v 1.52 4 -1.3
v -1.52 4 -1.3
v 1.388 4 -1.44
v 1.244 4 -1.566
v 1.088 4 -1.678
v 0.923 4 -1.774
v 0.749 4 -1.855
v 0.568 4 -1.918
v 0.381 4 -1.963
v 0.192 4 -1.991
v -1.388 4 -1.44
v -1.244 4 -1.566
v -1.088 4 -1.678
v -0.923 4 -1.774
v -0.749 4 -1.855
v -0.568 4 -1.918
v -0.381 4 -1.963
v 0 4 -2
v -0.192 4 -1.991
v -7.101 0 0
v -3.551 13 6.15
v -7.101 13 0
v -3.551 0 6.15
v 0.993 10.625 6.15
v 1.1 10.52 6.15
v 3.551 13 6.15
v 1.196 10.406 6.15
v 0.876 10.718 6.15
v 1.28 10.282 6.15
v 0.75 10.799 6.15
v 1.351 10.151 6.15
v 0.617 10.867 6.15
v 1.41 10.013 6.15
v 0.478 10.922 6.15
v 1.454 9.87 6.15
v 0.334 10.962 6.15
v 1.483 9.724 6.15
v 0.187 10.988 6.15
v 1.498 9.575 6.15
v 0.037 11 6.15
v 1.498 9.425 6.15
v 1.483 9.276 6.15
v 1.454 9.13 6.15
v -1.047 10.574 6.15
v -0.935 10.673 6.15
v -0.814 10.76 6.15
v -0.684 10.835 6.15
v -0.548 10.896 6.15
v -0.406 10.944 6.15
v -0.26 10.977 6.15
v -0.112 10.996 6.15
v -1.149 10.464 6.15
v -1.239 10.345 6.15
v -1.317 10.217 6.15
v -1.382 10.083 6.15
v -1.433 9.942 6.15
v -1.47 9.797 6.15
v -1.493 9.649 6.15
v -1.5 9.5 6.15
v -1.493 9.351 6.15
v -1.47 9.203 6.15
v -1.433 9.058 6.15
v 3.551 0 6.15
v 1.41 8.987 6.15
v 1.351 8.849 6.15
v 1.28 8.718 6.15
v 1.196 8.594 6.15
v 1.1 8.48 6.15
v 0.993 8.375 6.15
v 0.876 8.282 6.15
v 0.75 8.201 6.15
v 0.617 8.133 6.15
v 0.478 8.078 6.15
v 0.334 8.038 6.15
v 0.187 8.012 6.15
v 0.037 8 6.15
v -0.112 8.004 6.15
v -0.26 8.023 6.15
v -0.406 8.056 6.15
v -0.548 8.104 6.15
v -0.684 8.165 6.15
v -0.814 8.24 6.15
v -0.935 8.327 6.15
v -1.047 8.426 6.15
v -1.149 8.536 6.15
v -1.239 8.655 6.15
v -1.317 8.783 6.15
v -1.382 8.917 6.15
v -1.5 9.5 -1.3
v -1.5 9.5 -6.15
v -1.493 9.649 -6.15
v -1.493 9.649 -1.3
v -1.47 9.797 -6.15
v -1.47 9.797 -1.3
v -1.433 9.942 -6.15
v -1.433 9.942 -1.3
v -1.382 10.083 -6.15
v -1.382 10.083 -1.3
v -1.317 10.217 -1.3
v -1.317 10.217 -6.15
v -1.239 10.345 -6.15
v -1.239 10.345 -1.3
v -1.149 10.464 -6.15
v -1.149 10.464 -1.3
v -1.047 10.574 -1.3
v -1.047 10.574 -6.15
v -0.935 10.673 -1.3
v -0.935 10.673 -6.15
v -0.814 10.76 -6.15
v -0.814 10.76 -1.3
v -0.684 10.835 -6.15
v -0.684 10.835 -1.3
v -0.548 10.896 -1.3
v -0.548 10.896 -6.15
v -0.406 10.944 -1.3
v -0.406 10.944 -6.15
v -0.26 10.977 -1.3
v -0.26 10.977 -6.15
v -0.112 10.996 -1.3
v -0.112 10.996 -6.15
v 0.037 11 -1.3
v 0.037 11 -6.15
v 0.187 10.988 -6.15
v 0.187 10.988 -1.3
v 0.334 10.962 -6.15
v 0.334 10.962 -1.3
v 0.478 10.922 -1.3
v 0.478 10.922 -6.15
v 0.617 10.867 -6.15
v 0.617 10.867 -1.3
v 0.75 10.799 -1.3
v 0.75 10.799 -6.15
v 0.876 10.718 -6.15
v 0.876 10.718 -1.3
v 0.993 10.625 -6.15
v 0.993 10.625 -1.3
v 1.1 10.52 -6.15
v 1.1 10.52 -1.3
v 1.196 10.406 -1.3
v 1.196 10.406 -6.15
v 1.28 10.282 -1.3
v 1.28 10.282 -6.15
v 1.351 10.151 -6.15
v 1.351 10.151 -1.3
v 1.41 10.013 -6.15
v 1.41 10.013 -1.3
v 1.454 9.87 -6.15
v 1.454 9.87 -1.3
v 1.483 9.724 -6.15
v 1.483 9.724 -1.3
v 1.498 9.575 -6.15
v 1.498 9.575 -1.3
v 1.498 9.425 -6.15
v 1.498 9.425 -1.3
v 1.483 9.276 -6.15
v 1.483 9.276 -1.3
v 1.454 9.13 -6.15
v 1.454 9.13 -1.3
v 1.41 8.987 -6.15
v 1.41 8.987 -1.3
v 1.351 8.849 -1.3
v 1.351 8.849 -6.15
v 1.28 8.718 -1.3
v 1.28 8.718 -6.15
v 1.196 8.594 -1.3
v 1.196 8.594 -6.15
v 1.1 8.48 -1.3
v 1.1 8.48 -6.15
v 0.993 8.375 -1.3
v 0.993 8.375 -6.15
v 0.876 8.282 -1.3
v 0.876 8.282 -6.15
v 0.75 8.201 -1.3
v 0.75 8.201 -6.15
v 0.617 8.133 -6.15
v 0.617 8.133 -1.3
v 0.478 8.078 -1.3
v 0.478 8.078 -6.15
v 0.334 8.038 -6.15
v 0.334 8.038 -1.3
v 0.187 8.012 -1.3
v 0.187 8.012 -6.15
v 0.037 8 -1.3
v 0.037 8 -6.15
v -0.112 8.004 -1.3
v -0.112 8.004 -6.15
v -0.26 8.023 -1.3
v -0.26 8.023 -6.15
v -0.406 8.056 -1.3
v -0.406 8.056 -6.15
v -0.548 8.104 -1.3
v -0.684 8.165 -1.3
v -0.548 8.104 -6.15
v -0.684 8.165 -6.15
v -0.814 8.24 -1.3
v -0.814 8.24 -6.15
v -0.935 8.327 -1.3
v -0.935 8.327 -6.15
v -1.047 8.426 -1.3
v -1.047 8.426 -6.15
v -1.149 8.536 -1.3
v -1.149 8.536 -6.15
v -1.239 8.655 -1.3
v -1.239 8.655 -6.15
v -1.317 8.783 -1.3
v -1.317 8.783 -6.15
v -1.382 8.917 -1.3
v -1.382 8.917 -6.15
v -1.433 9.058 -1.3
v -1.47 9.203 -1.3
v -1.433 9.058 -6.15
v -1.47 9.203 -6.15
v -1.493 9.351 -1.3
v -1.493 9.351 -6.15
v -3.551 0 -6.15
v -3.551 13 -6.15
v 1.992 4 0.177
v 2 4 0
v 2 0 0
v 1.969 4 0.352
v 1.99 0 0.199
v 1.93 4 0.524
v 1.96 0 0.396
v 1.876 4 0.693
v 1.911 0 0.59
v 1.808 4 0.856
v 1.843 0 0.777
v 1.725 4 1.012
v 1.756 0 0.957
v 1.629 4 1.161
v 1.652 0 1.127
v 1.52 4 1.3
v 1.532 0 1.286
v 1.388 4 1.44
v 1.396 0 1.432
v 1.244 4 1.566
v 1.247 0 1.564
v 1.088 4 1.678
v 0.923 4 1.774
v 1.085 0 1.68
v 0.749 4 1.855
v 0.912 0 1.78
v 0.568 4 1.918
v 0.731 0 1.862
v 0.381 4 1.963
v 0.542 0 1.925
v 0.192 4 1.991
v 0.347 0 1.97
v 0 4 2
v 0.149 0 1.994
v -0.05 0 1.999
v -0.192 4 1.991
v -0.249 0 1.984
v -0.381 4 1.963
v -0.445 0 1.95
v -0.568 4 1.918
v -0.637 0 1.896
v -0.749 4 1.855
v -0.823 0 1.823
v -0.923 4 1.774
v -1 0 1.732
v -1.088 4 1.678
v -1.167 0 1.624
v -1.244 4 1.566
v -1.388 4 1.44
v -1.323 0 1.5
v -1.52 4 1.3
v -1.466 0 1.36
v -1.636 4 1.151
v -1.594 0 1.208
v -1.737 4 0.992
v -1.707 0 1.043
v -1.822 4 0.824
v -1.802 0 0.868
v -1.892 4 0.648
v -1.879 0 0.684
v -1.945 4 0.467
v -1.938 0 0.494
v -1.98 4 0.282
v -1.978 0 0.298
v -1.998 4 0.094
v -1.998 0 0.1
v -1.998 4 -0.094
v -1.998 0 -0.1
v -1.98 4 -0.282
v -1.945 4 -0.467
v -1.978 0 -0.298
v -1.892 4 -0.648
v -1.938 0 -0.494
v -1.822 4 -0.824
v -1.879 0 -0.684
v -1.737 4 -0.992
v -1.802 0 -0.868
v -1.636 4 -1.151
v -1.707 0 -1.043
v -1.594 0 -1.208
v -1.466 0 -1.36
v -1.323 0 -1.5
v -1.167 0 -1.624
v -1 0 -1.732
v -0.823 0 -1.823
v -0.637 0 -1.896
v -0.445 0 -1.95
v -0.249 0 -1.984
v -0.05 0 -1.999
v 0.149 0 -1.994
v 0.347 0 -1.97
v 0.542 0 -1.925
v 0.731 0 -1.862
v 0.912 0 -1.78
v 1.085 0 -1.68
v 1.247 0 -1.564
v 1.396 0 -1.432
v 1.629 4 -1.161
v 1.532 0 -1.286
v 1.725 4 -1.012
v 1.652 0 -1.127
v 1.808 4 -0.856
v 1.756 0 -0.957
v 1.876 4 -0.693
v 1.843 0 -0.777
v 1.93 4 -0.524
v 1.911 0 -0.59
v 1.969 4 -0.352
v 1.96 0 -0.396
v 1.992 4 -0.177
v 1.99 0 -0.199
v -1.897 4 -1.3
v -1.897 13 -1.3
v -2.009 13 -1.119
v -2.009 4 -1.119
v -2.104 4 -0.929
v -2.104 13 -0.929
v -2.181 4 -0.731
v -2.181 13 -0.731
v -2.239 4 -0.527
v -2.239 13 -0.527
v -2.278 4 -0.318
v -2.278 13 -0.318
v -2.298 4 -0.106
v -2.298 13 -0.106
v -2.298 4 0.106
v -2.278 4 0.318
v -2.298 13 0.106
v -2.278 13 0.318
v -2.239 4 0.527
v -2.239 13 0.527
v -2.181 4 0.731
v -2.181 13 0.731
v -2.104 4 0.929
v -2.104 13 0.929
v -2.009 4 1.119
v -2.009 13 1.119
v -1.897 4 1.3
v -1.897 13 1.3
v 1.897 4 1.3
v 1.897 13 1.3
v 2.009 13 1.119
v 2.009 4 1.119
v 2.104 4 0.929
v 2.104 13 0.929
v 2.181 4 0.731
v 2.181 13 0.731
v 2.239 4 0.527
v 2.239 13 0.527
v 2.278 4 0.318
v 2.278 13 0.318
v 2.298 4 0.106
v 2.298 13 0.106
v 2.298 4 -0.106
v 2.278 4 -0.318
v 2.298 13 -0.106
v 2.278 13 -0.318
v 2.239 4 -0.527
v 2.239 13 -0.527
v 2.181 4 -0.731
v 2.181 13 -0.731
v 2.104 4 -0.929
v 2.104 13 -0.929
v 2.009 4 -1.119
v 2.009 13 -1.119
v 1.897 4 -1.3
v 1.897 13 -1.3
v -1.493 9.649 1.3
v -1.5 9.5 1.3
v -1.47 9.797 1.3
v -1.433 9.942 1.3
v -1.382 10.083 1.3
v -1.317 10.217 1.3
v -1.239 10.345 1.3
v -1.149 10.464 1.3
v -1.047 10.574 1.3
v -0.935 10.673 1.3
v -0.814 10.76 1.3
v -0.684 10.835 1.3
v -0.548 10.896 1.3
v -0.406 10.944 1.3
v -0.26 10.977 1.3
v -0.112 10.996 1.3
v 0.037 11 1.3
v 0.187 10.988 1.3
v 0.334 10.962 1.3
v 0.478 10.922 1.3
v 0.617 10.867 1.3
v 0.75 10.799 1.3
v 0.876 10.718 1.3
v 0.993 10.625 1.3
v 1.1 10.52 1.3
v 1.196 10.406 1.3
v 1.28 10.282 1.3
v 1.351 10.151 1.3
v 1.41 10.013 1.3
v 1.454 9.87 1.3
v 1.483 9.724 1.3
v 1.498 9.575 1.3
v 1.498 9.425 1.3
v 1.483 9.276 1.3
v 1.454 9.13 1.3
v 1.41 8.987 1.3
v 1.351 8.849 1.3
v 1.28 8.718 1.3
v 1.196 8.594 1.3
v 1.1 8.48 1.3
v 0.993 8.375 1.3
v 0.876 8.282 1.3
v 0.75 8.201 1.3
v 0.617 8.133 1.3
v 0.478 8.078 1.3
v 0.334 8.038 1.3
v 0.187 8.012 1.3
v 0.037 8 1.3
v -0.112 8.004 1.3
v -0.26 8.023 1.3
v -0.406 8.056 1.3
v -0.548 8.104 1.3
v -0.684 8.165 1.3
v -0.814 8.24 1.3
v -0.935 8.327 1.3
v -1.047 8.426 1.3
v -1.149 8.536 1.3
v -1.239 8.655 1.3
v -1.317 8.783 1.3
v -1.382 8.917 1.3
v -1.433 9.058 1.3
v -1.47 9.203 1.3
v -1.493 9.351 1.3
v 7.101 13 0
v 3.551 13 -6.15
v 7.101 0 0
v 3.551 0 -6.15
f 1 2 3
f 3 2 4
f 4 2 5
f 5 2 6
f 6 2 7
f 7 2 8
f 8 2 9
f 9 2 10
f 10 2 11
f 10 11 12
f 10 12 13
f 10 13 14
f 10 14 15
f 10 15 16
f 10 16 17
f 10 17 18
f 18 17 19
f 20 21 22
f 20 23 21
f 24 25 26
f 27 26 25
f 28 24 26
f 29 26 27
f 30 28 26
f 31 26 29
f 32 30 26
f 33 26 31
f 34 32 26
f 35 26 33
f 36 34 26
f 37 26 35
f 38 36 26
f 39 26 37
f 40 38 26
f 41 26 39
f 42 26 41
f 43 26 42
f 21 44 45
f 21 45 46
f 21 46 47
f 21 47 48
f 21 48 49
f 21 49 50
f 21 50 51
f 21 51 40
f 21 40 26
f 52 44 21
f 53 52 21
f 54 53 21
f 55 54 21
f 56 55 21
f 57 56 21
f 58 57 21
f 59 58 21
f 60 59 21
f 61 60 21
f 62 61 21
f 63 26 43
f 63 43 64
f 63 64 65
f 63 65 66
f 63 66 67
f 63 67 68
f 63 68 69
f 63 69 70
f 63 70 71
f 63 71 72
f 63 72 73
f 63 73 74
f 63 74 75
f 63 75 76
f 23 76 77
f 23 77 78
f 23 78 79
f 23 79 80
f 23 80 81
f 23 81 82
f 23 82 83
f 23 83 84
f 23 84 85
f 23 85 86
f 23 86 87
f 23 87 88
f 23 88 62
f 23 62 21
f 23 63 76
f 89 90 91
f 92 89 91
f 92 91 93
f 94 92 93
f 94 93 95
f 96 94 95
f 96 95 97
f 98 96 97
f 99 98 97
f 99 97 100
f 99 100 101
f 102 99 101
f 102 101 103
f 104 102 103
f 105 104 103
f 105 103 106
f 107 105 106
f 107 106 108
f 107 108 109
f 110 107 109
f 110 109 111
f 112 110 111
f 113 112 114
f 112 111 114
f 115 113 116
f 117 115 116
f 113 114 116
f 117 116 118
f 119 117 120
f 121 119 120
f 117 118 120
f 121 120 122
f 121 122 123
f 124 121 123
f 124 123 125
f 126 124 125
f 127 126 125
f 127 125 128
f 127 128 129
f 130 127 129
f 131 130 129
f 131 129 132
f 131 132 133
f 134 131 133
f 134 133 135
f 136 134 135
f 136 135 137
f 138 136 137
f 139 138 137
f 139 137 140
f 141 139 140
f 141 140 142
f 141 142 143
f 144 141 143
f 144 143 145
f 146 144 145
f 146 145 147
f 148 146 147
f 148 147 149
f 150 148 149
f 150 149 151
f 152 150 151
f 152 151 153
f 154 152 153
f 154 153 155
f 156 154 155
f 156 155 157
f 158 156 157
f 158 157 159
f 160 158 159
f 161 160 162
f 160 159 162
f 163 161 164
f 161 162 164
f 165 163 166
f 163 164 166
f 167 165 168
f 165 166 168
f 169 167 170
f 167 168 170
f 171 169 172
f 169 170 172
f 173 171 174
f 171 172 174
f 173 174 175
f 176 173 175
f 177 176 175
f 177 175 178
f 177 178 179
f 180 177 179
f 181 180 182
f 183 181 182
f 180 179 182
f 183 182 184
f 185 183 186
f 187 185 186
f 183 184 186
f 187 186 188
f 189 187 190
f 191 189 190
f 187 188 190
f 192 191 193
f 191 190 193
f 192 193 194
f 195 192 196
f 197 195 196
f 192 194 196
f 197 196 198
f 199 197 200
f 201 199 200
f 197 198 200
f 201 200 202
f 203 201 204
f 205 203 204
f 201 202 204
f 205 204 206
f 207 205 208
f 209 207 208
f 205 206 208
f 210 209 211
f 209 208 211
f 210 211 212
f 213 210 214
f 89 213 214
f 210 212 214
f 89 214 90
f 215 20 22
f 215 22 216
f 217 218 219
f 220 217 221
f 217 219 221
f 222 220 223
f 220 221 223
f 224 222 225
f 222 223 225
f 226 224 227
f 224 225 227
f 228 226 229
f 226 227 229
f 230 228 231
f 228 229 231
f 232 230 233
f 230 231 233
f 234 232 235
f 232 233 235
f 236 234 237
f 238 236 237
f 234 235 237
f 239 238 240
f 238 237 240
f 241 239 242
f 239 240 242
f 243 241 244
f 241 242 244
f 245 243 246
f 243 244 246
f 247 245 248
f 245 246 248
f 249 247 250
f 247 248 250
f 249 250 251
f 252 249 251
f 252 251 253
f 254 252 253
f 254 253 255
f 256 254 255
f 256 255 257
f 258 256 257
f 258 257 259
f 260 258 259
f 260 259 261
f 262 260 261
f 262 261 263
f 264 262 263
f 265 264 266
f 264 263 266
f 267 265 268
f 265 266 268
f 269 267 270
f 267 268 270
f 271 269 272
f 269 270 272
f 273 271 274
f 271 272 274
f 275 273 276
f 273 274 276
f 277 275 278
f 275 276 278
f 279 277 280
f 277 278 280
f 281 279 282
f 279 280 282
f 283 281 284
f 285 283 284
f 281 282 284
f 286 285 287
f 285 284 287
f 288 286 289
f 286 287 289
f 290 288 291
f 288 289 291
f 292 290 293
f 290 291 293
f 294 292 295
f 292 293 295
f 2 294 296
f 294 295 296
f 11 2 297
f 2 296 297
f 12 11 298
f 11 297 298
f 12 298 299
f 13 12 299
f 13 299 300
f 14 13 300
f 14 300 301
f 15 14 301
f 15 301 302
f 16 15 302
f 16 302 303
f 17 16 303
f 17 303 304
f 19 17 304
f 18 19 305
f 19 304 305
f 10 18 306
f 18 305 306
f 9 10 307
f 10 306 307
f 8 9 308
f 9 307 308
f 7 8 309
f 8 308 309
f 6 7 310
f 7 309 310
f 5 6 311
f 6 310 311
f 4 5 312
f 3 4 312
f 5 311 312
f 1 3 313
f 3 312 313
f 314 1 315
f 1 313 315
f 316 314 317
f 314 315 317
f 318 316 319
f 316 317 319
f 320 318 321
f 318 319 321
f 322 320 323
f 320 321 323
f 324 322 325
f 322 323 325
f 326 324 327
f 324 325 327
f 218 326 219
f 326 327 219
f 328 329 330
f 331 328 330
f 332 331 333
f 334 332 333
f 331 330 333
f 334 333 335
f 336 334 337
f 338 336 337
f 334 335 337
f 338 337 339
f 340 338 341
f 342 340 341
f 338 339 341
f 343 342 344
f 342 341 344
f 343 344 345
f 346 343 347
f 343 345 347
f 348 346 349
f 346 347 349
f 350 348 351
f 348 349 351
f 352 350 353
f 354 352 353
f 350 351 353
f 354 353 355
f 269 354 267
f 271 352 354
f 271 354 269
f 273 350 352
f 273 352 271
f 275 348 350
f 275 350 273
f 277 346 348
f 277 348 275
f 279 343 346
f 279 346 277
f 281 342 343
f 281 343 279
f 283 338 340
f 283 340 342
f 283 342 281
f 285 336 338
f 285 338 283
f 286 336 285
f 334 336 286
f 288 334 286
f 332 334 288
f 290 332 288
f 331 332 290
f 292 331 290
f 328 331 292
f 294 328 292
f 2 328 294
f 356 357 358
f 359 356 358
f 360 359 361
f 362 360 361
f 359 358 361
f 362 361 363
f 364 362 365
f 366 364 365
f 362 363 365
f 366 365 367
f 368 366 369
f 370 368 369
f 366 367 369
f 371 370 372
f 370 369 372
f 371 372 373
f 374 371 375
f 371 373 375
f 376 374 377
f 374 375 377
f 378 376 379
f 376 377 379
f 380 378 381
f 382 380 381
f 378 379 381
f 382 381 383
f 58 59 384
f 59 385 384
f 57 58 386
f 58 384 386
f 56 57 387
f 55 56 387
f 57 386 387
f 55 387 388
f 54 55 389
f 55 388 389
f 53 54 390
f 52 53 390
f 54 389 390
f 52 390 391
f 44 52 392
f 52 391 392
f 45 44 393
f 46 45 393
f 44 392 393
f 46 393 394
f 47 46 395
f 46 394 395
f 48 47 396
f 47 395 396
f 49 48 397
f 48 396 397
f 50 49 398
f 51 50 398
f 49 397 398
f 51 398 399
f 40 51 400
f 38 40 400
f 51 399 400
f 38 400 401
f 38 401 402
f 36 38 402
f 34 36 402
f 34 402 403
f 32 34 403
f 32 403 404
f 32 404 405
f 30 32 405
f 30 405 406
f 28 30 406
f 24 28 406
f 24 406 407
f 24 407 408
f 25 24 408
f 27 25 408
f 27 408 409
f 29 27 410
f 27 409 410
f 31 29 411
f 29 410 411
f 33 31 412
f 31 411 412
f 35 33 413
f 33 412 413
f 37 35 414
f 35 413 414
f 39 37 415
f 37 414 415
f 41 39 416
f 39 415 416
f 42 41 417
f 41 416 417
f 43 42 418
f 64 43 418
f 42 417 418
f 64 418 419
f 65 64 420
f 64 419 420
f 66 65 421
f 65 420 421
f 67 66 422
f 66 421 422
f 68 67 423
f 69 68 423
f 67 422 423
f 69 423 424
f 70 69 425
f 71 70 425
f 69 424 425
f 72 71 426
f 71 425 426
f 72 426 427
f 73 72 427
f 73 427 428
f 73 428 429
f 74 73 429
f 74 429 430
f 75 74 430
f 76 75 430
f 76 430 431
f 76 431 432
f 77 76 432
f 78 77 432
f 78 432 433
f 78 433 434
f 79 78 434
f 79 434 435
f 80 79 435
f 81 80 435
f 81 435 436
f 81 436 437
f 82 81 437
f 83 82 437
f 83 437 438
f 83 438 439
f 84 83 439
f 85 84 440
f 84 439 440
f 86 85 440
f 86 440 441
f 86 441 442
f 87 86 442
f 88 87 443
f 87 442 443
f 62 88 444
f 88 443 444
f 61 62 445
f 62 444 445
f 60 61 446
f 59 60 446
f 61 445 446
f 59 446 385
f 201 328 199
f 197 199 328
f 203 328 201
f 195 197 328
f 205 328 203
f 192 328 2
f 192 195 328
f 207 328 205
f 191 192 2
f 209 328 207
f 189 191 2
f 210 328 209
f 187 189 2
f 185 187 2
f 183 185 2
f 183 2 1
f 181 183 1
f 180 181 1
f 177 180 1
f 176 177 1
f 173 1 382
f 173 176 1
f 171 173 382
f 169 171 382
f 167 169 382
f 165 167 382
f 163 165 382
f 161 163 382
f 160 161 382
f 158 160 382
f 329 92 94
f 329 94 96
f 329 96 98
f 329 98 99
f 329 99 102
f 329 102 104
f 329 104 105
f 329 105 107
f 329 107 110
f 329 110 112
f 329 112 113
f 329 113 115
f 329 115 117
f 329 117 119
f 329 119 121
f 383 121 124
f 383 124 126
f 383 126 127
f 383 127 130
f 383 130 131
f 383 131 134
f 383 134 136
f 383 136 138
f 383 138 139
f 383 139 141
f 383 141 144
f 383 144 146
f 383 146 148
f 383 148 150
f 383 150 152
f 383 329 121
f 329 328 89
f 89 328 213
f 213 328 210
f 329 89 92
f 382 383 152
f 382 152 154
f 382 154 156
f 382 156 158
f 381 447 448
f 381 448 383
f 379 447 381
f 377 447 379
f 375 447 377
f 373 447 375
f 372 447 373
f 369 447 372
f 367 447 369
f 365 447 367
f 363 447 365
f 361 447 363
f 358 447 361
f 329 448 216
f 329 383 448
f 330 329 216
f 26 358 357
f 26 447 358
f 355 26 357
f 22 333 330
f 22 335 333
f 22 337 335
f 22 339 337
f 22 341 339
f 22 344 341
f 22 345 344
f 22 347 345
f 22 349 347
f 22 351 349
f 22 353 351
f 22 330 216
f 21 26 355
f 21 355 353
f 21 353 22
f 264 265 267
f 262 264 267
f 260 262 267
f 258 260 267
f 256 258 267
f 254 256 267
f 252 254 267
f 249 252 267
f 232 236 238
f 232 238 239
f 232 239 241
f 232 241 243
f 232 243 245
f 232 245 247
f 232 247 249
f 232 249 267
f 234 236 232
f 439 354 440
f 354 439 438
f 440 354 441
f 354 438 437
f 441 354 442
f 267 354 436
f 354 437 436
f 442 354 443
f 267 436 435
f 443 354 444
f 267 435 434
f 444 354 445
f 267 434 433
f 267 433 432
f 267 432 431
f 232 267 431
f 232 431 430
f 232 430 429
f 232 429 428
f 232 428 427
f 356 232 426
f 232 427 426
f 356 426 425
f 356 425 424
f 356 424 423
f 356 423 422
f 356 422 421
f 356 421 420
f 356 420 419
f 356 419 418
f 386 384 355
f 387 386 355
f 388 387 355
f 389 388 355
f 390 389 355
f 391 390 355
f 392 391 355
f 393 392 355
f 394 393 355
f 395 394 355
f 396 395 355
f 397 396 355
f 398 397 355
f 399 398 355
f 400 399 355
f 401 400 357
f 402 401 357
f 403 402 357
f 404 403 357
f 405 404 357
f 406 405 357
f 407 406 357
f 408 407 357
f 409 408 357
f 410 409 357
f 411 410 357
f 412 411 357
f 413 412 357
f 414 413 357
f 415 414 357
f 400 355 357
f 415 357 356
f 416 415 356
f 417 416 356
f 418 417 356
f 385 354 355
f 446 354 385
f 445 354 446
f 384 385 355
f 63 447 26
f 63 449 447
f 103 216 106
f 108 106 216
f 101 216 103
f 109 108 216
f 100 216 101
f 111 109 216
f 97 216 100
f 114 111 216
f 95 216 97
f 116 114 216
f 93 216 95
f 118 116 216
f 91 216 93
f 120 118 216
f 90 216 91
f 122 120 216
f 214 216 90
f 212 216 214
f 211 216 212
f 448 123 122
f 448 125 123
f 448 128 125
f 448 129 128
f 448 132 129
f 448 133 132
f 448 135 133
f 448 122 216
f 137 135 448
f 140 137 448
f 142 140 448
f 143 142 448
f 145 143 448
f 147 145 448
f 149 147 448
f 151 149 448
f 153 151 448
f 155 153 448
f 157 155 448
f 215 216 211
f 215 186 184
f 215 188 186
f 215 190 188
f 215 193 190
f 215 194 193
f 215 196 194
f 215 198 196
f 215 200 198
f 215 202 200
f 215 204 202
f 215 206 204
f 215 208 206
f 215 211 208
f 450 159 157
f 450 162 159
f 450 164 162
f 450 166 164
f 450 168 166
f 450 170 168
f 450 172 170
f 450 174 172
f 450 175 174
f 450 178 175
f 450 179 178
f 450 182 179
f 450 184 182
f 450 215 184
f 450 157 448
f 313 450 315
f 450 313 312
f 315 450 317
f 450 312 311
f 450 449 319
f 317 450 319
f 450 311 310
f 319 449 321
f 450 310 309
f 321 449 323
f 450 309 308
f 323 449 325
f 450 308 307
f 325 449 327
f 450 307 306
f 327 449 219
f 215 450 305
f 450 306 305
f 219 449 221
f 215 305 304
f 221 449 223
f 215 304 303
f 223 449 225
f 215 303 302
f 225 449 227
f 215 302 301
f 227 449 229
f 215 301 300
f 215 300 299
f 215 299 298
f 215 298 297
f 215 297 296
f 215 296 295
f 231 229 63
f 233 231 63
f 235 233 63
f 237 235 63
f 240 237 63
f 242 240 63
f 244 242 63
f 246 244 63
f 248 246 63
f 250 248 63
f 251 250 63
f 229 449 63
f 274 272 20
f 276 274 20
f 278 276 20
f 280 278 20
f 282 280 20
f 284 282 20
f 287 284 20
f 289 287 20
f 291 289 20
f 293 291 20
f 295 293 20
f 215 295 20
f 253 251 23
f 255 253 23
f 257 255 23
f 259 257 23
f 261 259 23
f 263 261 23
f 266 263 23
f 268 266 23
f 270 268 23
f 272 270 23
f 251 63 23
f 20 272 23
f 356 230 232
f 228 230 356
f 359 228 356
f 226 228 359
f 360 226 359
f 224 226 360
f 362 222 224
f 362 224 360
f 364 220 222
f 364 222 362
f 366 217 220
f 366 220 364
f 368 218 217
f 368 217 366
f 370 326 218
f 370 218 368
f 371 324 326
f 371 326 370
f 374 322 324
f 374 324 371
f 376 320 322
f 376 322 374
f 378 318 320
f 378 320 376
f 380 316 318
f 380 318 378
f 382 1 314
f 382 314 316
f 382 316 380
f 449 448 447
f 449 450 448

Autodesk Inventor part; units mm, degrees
ref_plane "YZ Plane" through (0, 0, 0) normal (1, 0, 0) x (0, 1, 0)
ref_plane "XZ Plane" through (0, 0, 0) normal (0, 1, 0) x (-1, 0, 0)
ref_plane "XY Plane" through (0, 0, 0) normal (0, 0, 1) x (1, 0, 0)
sketch "Sketch1" plane through (0, 0, 0) normal (0, 1, 0) x (-1, 0, 0)
  line L0 (7.1014, 0) -> (3.5507, -6.15)
  line L1 (3.5507, -6.15) -> (-3.5507, -6.15)
  line L2 (-3.5507, -6.15) -> (-7.1014, 0)
  line L3 (-7.1014, 0) -> (-3.5507, 6.15)
  line L4 (-3.5507, 6.15) -> (3.5507, 6.15)
  line L5 (3.5507, 6.15) -> (7.1014, 0)
  line L6 (0, 0) -> (25.8005, 0) construction
  dimension "d0" = 12.3
extrude "Extrusion1" add sketch "Sketch1" along normal blind 13
sketch "Sketch2" plane through (0, 13, 0) normal (0, 1, 0) x (1, 0, 0)
  line L0 (3.5507, 6.15) -> (-3.5507, 6.15) projected
  line L1 (-1.8974, 1.3) -> (1.8974, 1.3)
  line L2 (-1.8974, -1.3) -> (1.8974, -1.3)
  arc A0 (-1.8974, 1.3) -> (-1.8974, -1.3) centre (0, 0) ccw
  arc A1 (1.8974, -1.3) -> (1.8974, 1.3) centre (0, 0) ccw
  dimension "d4" = 2.6
  dimension "d5" = 2.3
  dimension "d6" = 2.3
extrude "Extrusion2" cut sketch "Sketch2" against normal blind 9
sketch "Sketch6" plane through (0, 0, 0) normal (0, -1, 0) x (1, 0, 0)
  circle A0 centre (0, 0) radius 2
  dimension "d16" = 4
extrude "Extrusion5" cut sketch "Sketch6" against normal up to surface (4 mm away)
sketch "Sketch7" plane through (3.5507, 0, -6.15) normal (0, 0, -1) x (-1, 0, 0)
  line L0 (0, 13) -> (7.1014, 13) projected
  line L1 (0, 0) -> (0, 13) projected
  circle A0 centre (3.5507, 9.5) radius 1.5
  line L2 (3.5507, 0) -> (3.5507, 15.2107) construction
  dimension "d19" = 3
  dimension "d20" = 3.5
extrude "Extrusion6" cut sketch "Sketch7" against normal through all
equation "\"Plastic_Reduction_Margin\" = 0.3"
properties part number "Hub_Hex_12mm" material "Polyethylene, Low Density"
